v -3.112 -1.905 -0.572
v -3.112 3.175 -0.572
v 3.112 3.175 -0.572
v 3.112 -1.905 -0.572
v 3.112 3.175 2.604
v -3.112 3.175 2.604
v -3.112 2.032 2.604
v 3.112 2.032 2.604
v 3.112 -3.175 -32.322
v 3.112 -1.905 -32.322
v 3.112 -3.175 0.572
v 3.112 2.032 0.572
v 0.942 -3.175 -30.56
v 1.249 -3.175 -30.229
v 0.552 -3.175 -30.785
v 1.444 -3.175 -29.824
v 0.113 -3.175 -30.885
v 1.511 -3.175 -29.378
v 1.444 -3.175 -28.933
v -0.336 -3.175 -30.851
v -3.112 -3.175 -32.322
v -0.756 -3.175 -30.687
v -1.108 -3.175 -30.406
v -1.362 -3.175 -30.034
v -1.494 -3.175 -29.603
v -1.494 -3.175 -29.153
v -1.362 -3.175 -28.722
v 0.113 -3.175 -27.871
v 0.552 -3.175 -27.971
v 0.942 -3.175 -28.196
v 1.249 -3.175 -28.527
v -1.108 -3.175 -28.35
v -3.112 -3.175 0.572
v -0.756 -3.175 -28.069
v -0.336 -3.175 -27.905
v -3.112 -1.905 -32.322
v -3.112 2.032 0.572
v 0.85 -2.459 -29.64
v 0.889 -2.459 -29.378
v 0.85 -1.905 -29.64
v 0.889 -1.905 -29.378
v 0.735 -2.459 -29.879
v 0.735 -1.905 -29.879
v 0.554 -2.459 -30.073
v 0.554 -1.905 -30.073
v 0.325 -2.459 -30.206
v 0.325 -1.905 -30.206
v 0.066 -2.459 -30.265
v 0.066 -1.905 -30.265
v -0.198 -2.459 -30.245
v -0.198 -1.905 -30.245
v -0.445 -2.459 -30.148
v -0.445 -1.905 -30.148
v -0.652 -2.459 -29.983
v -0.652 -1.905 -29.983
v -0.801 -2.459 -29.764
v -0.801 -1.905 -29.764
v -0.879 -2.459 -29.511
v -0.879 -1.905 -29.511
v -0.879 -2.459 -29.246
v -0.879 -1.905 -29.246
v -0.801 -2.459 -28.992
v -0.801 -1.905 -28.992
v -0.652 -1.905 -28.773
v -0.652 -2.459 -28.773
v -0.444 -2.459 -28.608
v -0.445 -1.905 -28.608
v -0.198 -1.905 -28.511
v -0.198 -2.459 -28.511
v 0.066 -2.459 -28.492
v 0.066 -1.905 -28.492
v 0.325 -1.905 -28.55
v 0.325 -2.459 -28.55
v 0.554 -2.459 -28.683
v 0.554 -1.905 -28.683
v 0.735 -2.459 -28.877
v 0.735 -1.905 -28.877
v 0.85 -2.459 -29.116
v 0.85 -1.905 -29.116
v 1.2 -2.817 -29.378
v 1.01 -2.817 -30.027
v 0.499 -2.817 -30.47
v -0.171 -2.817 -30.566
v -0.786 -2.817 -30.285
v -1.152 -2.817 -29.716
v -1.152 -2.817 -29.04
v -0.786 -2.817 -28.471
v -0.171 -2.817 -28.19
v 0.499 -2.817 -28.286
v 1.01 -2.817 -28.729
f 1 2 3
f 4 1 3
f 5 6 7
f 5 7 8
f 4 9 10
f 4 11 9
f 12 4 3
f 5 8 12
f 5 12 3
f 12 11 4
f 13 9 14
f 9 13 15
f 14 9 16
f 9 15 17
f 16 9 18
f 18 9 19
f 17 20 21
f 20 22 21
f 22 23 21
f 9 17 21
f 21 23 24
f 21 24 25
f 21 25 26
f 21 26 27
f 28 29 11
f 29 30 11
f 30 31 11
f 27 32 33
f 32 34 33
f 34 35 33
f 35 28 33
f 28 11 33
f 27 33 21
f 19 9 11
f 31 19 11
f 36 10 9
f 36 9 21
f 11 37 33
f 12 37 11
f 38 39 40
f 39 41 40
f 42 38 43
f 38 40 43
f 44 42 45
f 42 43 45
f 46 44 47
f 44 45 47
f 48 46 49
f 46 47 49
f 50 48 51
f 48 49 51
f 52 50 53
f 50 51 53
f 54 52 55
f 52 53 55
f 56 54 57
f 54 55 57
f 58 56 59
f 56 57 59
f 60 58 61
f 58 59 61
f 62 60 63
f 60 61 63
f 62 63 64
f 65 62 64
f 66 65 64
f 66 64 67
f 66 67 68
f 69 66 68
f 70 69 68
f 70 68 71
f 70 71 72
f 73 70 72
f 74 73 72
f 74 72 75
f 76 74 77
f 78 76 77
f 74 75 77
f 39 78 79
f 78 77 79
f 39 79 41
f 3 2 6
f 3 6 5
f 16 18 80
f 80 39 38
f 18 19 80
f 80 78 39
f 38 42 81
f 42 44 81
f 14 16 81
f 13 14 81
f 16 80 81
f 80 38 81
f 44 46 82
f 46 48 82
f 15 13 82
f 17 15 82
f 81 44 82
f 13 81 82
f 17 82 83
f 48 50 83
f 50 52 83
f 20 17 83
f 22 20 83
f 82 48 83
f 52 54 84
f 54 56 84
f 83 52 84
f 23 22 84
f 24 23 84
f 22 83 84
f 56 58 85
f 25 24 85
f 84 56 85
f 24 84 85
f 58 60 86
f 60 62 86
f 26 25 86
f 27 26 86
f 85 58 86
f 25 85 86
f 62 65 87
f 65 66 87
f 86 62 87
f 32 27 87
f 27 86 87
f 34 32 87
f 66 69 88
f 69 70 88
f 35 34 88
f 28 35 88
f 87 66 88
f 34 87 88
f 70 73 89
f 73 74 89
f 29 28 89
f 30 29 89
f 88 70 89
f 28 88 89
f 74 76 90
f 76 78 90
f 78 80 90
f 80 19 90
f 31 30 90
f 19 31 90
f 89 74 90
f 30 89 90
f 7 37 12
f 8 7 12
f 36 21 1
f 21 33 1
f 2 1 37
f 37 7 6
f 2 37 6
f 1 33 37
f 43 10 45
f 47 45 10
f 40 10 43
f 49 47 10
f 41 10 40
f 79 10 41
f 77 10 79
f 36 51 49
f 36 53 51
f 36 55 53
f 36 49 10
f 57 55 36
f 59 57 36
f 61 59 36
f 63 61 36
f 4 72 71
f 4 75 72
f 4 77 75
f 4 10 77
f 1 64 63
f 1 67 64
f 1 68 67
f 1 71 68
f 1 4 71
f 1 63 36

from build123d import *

# Parameters (mm, degrees)
SKETCH1_W                                      = 6.223
SKETCH1_H                                      = 1.143
BOSS_EXTRUDE1_DEPTH                            = 3.175
SKETCH2_W                                      = 6.223
SKETCH2_H                                      = 1.143
BOSS_EXTRUDE2_DEPTH                            = 2.032
SKETCH3_W                                      = 6.223
SKETCH3_H                                      = 1.27
BOSS_EXTRUDE3_DEPTH                            = 31.75
CSK_FOR_0_FLAT_HEAD_MACHINE_SCREW1_D           = 1.778
CSK_FOR_0_FLAT_HEAD_MACHINE_SCREW1_DEPTH       = 4.572
CSK_FOR_0_FLAT_HEAD_MACHINE_SCREW1_CSINK_D     = 3.0226
CSK_FOR_0_FLAT_HEAD_MACHINE_SCREW1_CSINK_ANGLE = 82
CSK_FOR_0_FLAT_HEAD_MACHINE_SCREW1_TIP         = 0.53416509


with BuildPart() as part:
    # Sketch1 → Boss-Extrude1 (new, symmetric)
    with BuildSketch(Plane(origin=(0, 0, 0), x_dir=(1, 0, 0), z_dir=(0, 1, 0))):
        Rectangle(SKETCH1_W, SKETCH1_H)
    extrude(amount=BOSS_EXTRUDE1_DEPTH, both=True)

    # Sketch2 → Boss-Extrude2 (add)
    with BuildSketch(Plane.XY.offset(0.5715)):
        with Locations((0, 2.6035)):
            Rectangle(SKETCH2_W, SKETCH2_H)
    extrude(amount=BOSS_EXTRUDE2_DEPTH)

    # Sketch3 → Boss-Extrude3 (add)
    with BuildSketch(Plane(origin=(0, 0, -0.5715), x_dir=(-1, 0, 0), z_dir=(0, 0, -1))):
        with Locations((0, -2.54)):
            Rectangle(SKETCH3_W, SKETCH3_H)
    extrude(amount=BOSS_EXTRUDE3_DEPTH)

    # CSK for #0 Flat Head Machine Screw1
    with Locations(Plane(origin=(0, -3.175, 0), x_dir=(-1, 0, 0), z_dir=(0, -1, 0))):
        with Locations((0, 29.378038883)):
            CounterSinkHole(CSK_FOR_0_FLAT_HEAD_MACHINE_SCREW1_D / 2, CSK_FOR_0_FLAT_HEAD_MACHINE_SCREW1_CSINK_D / 2, depth=CSK_FOR_0_FLAT_HEAD_MACHINE_SCREW1_DEPTH, counter_sink_angle=CSK_FOR_0_FLAT_HEAD_MACHINE_SCREW1_CSINK_ANGLE)
            with Locations((0, 0, -(CSK_FOR_0_FLAT_HEAD_MACHINE_SCREW1_DEPTH + CSK_FOR_0_FLAT_HEAD_MACHINE_SCREW1_TIP / 2))):  # 118° drill point
                Cone(0, CSK_FOR_0_FLAT_HEAD_MACHINE_SCREW1_D / 2, CSK_FOR_0_FLAT_HEAD_MACHINE_SCREW1_TIP, mode=Mode.SUBTRACT)


solid = part.part
